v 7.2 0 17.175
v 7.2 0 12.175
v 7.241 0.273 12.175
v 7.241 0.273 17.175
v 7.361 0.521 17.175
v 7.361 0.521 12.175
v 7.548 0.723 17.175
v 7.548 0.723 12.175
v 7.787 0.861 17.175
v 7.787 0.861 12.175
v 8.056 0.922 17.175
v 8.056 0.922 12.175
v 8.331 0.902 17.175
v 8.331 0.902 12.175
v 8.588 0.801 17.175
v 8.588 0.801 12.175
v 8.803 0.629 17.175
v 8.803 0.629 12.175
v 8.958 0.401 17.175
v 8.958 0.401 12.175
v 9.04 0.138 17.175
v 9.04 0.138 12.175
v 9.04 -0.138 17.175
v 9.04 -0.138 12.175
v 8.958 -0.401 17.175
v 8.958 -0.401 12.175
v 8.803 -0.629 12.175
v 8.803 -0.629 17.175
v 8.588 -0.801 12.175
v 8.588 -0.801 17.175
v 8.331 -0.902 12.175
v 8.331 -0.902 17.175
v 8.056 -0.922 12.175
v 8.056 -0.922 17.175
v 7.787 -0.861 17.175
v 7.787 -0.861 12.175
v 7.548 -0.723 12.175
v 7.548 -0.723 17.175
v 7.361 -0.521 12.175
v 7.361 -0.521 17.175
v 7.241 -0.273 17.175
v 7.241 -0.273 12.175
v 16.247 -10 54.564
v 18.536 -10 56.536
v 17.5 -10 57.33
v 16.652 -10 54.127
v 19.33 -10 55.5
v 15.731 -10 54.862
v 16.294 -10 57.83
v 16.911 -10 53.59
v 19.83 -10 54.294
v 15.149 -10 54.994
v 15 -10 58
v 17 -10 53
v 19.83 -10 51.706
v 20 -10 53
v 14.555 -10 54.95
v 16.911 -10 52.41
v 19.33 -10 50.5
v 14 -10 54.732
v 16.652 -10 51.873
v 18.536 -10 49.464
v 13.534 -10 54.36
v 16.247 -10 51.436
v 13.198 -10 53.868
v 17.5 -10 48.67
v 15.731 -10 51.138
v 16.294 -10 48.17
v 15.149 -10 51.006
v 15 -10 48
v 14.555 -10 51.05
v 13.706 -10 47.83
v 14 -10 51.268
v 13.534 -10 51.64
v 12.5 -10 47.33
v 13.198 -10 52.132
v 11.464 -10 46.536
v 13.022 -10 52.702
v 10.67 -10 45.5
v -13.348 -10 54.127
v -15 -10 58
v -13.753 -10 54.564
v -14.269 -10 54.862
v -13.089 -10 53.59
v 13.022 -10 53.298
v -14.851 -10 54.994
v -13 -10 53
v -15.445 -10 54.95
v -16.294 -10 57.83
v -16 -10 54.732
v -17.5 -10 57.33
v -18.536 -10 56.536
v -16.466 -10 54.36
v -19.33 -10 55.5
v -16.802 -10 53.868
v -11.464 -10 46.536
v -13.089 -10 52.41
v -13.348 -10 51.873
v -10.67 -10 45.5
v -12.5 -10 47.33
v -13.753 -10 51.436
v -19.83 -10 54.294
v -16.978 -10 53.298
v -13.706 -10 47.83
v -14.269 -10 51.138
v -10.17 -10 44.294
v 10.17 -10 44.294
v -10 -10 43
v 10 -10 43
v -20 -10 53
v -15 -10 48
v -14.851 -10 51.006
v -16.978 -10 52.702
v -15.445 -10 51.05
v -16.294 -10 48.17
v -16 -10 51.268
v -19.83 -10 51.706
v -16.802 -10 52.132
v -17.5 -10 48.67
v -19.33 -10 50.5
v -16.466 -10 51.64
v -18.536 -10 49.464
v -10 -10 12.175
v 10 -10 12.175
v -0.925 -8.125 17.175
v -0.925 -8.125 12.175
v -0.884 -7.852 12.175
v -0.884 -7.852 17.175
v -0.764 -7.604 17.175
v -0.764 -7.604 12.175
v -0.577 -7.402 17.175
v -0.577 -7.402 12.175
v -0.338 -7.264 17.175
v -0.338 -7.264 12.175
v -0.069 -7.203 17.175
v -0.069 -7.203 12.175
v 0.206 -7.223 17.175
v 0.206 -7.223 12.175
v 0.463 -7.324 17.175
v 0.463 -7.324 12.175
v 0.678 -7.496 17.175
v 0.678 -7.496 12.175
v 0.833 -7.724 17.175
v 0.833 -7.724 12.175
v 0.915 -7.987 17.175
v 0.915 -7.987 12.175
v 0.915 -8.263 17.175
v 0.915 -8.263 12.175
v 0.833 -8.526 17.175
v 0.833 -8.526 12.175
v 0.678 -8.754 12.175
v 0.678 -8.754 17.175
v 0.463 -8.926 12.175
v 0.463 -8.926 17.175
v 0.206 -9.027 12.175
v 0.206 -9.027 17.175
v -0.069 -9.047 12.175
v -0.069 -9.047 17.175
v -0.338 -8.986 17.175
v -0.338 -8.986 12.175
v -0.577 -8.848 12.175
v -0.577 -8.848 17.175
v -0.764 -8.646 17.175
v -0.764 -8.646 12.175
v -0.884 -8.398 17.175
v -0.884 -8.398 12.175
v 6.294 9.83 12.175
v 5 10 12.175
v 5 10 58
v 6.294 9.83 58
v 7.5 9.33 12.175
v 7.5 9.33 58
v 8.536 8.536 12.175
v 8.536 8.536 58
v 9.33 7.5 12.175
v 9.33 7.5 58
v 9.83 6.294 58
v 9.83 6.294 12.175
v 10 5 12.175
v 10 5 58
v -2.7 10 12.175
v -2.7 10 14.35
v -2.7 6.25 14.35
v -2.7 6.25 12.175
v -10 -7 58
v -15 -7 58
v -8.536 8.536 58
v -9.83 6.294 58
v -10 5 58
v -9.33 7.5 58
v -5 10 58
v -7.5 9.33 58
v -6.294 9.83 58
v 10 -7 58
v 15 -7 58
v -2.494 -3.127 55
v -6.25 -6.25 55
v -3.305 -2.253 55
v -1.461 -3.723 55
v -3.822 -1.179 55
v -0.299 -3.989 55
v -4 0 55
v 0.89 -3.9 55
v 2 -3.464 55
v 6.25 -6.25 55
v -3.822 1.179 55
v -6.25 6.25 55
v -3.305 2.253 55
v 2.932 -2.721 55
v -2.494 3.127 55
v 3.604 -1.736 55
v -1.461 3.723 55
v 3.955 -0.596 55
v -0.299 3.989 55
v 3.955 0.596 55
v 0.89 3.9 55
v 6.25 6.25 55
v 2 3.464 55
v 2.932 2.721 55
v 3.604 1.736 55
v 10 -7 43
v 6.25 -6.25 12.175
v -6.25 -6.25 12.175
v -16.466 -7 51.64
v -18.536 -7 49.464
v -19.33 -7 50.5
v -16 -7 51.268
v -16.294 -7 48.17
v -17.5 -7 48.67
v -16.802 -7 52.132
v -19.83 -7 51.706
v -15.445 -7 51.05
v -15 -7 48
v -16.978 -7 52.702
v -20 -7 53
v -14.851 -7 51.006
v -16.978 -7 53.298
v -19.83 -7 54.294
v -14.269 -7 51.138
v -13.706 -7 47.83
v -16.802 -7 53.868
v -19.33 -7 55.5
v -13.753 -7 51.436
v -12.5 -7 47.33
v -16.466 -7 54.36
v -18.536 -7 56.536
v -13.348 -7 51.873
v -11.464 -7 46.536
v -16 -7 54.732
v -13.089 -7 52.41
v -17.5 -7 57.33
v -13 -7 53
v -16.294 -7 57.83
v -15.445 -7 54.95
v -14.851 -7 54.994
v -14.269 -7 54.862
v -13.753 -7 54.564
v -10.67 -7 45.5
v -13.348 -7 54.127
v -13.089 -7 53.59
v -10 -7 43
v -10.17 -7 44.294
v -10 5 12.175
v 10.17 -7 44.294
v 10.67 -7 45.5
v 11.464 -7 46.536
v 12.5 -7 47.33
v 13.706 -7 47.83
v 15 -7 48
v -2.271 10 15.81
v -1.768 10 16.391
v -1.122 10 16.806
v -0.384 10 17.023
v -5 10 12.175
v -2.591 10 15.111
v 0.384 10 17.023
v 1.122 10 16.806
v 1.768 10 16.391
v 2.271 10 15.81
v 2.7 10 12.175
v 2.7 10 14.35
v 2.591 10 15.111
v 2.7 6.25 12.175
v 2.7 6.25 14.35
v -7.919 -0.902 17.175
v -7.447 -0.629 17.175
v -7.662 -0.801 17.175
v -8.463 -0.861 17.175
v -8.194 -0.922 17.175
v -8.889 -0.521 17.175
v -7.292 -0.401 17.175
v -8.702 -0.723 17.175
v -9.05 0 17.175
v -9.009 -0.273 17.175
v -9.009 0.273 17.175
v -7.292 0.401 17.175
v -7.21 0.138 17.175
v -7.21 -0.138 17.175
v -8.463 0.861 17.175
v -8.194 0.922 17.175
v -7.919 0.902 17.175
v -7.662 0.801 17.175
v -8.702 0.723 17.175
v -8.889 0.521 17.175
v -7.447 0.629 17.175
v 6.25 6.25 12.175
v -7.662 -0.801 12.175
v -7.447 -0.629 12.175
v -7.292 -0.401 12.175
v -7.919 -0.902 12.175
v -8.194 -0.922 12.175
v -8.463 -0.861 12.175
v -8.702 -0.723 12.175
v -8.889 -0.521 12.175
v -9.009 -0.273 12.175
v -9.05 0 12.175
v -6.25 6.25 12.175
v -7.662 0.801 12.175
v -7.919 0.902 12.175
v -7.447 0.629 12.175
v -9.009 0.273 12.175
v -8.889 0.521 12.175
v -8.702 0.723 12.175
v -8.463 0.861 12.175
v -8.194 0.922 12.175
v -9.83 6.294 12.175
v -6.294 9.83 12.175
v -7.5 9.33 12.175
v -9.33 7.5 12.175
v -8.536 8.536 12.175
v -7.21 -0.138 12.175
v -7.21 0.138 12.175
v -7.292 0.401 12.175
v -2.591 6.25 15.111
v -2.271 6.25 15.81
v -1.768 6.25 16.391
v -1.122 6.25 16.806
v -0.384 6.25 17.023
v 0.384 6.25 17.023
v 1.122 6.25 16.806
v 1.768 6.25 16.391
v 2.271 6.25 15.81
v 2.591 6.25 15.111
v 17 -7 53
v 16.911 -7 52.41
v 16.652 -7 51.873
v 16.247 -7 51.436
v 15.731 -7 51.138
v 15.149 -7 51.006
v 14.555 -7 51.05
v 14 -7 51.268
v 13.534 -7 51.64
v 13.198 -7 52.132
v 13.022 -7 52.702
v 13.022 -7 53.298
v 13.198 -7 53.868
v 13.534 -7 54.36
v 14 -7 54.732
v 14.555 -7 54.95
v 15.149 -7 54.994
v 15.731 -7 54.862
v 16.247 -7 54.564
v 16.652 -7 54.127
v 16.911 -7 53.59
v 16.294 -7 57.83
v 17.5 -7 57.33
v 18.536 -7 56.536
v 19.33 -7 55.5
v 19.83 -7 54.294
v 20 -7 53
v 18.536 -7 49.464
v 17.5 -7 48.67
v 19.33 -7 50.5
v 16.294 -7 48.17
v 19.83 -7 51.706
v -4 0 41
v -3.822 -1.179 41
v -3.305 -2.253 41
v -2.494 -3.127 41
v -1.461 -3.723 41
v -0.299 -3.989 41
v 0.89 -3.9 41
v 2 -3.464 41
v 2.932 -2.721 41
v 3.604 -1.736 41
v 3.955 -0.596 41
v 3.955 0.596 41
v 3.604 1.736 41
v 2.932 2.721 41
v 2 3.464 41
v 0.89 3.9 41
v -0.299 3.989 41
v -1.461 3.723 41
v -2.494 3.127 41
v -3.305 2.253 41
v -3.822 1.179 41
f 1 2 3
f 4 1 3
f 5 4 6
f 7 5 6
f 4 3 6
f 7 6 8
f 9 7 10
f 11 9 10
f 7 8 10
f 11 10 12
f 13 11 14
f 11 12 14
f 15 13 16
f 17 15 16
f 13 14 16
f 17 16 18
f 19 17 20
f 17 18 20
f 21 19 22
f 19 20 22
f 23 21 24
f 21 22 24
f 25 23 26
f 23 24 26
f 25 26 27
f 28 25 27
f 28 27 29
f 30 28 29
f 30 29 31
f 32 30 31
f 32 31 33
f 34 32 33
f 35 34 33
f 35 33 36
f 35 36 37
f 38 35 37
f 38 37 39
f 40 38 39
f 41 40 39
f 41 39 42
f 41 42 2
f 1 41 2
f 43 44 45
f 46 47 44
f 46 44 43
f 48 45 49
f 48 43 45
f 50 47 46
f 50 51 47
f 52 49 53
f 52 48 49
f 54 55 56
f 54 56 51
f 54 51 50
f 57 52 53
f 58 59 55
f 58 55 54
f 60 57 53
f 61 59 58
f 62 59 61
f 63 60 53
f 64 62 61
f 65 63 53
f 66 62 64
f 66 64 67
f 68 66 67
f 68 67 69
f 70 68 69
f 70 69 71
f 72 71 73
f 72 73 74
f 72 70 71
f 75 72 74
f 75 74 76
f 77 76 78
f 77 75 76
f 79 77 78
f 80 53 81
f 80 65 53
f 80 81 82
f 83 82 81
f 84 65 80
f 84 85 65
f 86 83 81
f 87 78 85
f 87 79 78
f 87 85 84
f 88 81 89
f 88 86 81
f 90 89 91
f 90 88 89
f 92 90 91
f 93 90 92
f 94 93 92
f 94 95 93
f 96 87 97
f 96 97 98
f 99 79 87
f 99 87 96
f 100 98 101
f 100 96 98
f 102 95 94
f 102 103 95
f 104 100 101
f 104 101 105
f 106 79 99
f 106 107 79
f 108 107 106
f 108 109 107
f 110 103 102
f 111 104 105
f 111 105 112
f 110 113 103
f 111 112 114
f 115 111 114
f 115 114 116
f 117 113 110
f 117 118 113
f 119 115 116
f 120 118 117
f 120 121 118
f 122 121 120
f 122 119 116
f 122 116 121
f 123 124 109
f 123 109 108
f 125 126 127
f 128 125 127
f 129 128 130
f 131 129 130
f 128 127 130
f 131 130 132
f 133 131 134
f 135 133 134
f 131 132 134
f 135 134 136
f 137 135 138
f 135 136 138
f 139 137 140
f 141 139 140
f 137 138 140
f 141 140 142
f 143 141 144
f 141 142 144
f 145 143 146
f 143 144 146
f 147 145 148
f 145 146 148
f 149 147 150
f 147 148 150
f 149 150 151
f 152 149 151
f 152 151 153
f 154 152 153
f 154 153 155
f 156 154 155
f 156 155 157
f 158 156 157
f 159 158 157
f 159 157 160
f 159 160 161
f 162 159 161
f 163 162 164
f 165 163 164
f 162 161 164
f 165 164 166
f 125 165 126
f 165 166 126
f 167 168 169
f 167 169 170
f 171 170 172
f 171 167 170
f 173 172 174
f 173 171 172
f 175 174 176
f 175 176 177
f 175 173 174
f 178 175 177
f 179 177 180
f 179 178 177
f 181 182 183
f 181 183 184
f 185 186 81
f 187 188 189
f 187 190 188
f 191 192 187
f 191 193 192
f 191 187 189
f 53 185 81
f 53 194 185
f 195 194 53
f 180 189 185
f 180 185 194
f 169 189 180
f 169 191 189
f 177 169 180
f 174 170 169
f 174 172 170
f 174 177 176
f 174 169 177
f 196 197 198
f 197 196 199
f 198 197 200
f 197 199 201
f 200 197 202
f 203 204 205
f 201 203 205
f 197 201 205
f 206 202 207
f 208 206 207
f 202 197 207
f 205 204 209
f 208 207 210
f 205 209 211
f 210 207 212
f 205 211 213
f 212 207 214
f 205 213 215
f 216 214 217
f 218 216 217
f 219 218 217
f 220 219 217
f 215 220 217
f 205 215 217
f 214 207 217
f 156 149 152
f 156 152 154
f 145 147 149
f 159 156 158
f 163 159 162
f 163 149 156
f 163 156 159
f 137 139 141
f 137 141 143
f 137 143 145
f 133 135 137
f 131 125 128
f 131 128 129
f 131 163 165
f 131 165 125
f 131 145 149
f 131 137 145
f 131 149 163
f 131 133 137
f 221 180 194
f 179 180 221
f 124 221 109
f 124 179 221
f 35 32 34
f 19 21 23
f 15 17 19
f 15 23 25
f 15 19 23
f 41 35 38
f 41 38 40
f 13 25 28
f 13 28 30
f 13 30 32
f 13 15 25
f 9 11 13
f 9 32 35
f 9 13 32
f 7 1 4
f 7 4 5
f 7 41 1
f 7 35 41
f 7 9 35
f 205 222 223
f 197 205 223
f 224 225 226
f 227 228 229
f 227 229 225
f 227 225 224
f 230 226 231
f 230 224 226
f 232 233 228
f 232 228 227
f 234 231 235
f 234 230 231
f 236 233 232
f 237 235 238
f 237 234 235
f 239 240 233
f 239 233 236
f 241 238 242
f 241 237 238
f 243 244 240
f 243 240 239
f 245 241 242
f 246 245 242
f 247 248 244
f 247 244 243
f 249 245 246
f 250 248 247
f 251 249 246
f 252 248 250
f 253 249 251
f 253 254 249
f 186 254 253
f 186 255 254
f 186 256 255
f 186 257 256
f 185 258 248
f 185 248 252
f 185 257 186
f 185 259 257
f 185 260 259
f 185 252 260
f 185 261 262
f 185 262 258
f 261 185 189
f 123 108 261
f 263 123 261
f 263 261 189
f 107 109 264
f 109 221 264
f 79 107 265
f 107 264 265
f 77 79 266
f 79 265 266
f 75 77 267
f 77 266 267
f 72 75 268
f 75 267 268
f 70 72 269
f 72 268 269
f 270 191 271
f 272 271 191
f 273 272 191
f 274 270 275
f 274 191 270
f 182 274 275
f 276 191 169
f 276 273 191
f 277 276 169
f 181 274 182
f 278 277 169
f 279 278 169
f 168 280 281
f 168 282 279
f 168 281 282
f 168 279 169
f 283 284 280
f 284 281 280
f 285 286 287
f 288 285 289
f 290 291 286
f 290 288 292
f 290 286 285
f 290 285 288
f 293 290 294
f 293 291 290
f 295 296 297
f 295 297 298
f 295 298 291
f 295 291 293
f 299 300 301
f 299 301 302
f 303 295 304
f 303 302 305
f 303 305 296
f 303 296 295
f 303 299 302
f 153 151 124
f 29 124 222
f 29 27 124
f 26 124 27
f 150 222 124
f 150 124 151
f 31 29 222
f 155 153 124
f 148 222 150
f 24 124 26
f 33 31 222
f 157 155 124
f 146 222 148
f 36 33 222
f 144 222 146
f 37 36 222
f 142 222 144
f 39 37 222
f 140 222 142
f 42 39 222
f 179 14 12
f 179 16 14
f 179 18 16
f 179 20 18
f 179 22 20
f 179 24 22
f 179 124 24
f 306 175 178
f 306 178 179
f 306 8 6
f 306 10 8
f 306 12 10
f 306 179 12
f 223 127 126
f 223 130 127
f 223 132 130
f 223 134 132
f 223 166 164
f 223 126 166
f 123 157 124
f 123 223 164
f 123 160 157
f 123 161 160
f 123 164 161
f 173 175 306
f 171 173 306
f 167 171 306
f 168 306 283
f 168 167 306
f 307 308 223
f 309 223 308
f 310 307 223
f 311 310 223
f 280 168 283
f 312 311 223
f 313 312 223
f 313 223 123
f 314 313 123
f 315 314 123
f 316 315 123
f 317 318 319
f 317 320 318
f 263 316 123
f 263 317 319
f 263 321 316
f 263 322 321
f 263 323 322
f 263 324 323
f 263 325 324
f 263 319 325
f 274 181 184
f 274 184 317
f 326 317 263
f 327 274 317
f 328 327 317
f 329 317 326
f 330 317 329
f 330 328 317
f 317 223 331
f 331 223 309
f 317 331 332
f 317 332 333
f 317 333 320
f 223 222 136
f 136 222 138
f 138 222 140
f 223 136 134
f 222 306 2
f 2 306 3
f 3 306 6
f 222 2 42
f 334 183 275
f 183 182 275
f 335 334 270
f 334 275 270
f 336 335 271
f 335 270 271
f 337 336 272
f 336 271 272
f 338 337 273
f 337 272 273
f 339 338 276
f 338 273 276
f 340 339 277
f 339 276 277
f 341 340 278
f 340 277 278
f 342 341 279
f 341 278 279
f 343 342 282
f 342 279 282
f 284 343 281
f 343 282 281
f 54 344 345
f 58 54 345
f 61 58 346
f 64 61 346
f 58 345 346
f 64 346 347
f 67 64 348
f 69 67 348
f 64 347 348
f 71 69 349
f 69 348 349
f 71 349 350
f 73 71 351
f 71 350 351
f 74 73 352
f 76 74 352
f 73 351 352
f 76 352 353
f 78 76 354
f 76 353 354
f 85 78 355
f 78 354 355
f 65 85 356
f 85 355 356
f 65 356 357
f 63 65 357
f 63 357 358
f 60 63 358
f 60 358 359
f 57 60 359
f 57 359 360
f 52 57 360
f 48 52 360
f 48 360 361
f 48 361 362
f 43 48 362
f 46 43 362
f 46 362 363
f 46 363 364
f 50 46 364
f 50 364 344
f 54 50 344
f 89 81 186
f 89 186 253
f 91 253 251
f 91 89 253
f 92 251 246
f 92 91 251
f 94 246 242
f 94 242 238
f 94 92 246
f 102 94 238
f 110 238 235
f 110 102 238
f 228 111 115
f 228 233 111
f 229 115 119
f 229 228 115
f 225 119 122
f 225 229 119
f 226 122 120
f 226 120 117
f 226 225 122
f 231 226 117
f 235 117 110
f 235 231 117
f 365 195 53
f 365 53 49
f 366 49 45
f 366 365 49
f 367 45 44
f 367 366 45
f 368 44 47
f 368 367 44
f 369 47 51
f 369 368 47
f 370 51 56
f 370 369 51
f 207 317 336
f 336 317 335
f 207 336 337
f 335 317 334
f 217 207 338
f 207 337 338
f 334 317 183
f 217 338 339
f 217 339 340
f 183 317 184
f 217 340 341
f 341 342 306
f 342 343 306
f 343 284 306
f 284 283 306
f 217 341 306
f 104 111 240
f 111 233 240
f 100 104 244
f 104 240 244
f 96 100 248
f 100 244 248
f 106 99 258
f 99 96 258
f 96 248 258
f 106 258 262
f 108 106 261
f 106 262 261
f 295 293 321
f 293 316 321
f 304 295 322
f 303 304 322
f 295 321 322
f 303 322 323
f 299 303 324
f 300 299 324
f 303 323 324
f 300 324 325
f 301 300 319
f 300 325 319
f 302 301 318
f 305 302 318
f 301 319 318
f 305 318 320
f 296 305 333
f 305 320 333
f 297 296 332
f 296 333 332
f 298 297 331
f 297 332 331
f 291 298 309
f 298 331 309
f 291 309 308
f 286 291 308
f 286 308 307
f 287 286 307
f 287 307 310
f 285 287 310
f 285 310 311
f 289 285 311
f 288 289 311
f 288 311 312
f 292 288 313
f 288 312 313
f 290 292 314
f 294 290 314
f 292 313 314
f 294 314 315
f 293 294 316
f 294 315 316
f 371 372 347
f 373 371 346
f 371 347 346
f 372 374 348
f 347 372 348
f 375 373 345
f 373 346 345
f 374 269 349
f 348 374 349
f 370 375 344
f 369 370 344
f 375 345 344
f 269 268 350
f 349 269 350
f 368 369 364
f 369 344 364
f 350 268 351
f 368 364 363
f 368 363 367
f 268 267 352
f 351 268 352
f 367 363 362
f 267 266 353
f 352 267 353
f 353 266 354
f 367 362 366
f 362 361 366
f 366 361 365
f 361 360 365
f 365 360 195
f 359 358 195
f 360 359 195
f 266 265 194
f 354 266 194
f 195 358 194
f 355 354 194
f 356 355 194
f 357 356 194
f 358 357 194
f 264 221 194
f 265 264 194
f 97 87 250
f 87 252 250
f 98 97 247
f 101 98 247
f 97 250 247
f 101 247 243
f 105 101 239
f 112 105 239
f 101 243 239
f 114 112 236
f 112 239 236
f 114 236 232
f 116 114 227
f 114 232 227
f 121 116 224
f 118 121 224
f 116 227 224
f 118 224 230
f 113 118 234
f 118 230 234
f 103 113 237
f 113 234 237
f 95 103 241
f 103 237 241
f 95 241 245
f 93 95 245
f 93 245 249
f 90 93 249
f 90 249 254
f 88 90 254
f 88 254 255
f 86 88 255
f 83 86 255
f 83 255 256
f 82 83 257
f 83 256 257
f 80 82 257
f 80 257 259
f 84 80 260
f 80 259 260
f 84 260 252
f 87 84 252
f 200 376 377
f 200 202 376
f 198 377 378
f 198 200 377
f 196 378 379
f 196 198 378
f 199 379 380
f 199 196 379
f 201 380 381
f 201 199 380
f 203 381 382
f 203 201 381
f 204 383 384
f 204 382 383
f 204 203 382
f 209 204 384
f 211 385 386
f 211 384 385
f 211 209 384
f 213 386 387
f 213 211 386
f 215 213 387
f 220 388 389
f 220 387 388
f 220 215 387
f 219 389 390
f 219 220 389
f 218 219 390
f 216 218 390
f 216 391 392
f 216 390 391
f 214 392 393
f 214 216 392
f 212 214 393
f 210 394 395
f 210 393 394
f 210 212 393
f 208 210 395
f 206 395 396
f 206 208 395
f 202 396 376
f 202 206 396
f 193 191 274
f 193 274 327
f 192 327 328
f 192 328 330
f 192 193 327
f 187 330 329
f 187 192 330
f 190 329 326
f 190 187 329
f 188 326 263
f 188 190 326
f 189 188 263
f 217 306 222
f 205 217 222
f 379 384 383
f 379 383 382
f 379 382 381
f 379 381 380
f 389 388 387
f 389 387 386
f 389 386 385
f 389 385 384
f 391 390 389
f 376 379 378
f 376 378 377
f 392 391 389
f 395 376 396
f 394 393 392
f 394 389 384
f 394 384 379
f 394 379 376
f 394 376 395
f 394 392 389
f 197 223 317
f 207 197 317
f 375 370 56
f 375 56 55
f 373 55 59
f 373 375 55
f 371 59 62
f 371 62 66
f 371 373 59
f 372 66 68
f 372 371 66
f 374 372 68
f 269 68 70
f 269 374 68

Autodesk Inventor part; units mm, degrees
ref_plane "YZ Plane" through (0, 0, 0) normal (1, 0, 0) x (0, 1, 0)
ref_plane "XZ Plane" through (0, 0, 0) normal (0, 1, 0) x (-1, 0, 0)
ref_plane "XY Plane" through (0, 0, 0) normal (0, 0, 1) x (1, 0, 0)
sketch "Sketch1" plane through (0, 0, 0) normal (0, 0, 1) x (1, 0, 0)
  line L0 (-6.25, 6.25) -> (6.25, 6.25)
  line L1 (6.25, 6.25) -> (6.25, -6.25)
  line L2 (6.25, -6.25) -> (-6.25, -6.25)
  line L3 (-6.25, -6.25) -> (-6.25, 6.25)
  line L4 (-10, 10) -> (10, 10)
  line L5 (10, 10) -> (10, -10)
  line L6 (10, -10) -> (-10, -10)
  line L7 (-10, -10) -> (-10, 10)
  line L8 (-10, 10) -> (10, -10) construction
  line L9 (10, 10) -> (-10, -10) construction
  dimension "d3" = 20
  dimension "d4" = 20
  dimension "d5" = 3.75
  dimension "d6" = 16.25
  dimension "d7" = 3.75
  dimension "d8" = 16.25
extrude "Extrusion1" add sketch "Sketch1" along normal blind 55
sketch "Sketch2" plane through (0, 0, 55) normal (0, 0, 1) x (1, 0, 0)
  line L0 (10, 10) -> (-10, 10) projected
  line L1 (-10, -10) -> (10, -10)
  line L2 (10, -10) -> (10, 10)
  line L3 (10, 10) -> (-10, 10)
  line L4 (-10, 10) -> (-10, -10)
  line L5 (-10, -10) -> (10, 10) construction
  line L6 (10, -10) -> (-10, 10) construction
  point P0 (0, 0)
extrude "Extrusion2" add sketch "Sketch2" along normal blind 3
sketch "Sketch3" plane through (0, 0, 55) normal (0, 0, -1) x (-1, 0, 0)
  circle A0 centre (0, 0) radius 4
  dimension "d13" = 8
extrude "Extrusion3" add sketch "Sketch3" along normal blind 14
sketch "Sketch4" plane through (10, -10, 0) normal (1, 0, 0) x (0, 0, -1)
  line L0 (0, 0) -> (-58, 0) projected
  line L1 (0, 0) -> (-10, 0)
  line L2 (-10, 0) -> (-10, 3)
  line L3 (-10, 3) -> (0, 3)
  line L4 (0, 3) -> (0, 0)
  line L5 (-58, 0) -> (-58, 20) projected
  line L6 (-58, 0) -> (-48, 0)
  line L7 (-48, 0) -> (-48, 3)
  line L8 (-48, 3) -> (-58, 3)
  line L9 (-58, 3) -> (-58, 0)
  point P0 (0, 10)
  dimension "d16" = 10
  dimension "d17" = 3
  dimension "d18" = 10
  dimension "d19" = 3
extrude "Extrusion4" add sketch "Sketch4" along normal blind 10
sketch "Sketch5" plane through (-10, -10, 0) normal (-1, 0, 0) x (0, 0, 1)
  line L0 (0, 0) -> (0, 20) projected
  line L1 (0, 3) -> (10, 3) projected
  line L2 (0, 0) -> (10, 0)
  line L3 (10, 0) -> (10, 3)
  line L4 (10, 3) -> (0, 3)
  line L5 (0, 3) -> (0, 0)
  line L6 (58, 20) -> (58, 0) projected
  line L7 (58, 0) -> (48, 0)
  line L8 (48, 0) -> (48, 3)
  line L9 (48, 3) -> (58, 3)
  line L10 (58, 3) -> (58, 0)
  point P0 (0, 10)
  dimension "d22" = 10
  dimension "d23" = 3
  dimension "d24" = 10
  dimension "d25" = 3
extrude "Extrusion5" add sketch "Sketch5" along normal blind 10
fillet "Fillet1" radius 5 12 edges at (-20, -8.5, 10) (-20, -8.5, 0) (-10, -8.5, 10) (-10, -8.5, 48) (-20, -8.5, 48) (-20, -8.5, 58) (20, -8.5, 0) (10, -8.5, 10) (20, -8.5, 10) (10, -8.5, 48) (20, -8.5, 48) (20, -8.5, 58)
sketch "Sketch6" plane through (10, -7, 15) normal (0, 1, 0) x (1, 0, 0)
  arc A0 (-25, 15) -> (-25, 5) centre (-25, 10) ccw projected
  circle A1 centre (-25, 10) radius 2
  arc A2 (5, 5) -> (5, 15) centre (5, 10) ccw projected
  circle A3 centre (5, 10) radius 2
  arc A4 (-25, -33) -> (-25, -43) centre (-25, -38) ccw projected
  circle A5 centre (-25, -38) radius 2
  arc A6 (5, -43) -> (5, -33) centre (5, -38) ccw projected
  circle A7 centre (5, -38) radius 2
  point P0 (-10, 15)
  dimension "d29" = 4
  dimension "d30" = 4
  dimension "d31" = 4
extrude "Extrusion6" cut sketch "Sketch6" against normal blind 10
fillet "Fillet2" radius 5 2 edges at (-10, 10, 29) (10, 10, 29)
sketch "Sketch7" plane through (-5, 10, 0) normal (0, 1, 0) x (1, 0, 0)
  arc A0 (7.7, -10) -> (2.3, -10) centre (5, -10) ccw
  line L0 (0, -58) -> (0, 0) projected
  arc A1 (2.3, -14.35) -> (7.7, -14.35) centre (5, -14.35) ccw
  line L1 (2.3, -14.35) -> (2.3, -10)
  line L2 (7.7, -14.35) -> (7.7, -10)
  point P0 (5, 0)
  dimension "d35" = 5.4
  dimension "d36" = 5
  dimension "d37" = 10
  dimension "d38" = 5.4
  dimension "d39" = 4.35
  dimension "d40" = 5
extrude "Extrusion7" cut sketch "Sketch7" against normal blind 10
sketch "Sketch8" plane through (-5, 10, 0) normal (0, 1, 0) x (1, 0, 0)
  line L0 (2.3, -10) -> (2.3, -14.35) projected
  line L1 (2.3, -12.175) -> (-5, -12.175)
  line L2 (-5, 0) -> (-5, -58) projected
  arc A0 (-5, -15) -> (-10, -10) centre (-10, -15) ccw projected
  line L3 (-5, -12.175) -> (-5, -15)
  line L4 (-5, -15) -> (-18.139, -15)
  line L5 (-18.139, -15) -> (-18.139, 3.699)
  line L6 (-18.139, 3.699) -> (27.6458, 3.699)
  line L7 (27.6458, 3.699) -> (27.6458, -15)
  line L8 (15, -15) -> (15, -43) projected
  line L9 (27.6458, -15) -> (15, -15)
  line L10 (15, -15) -> (15, -12.175)
  arc A1 (20, -10) -> (15, -15) centre (20, -15) ccw projected
  line L11 (15, -12.175) -> (2.3, -12.175)
  point P0 (5, 0)
  dimension "d43" = 12.6458
  dimension "d44" = 33.139
  dimension "d45" = 18.699
extrude "Extrusion8" cut sketch "Sketch8" against normal blind 20
sketch "Sketch9" plane through (-2.7, 10, 12.175) normal (0, 0, -1) x (-1, 0, 0)
  circle A0 centre (-10.825, -10) radius 0.925
  circle A1 centre (-2.7, -18.125) radius 0.925
  circle A2 centre (5.425, -10) radius 0.925
  line L0 (-12.7, -20) -> (-12.7, -5) projected
  line L1 (7.3, -20) -> (-12.7, -20) projected
  line L2 (3.55, -16.25) -> (3.55, -3.75) projected
  point P0 (-2.7, -10)
  dimension "d48" = 1.85
  dimension "d49" = 1.85
  dimension "d50" = 1.85
  dimension "d51" = 1.875
  dimension "d52" = 1.875
  dimension "d53" = 1.875
  dimension "d54" = 0
  dimension "d55" = 0
  dimension "d56" = 0
extrude "Extrusion9" cut sketch "Sketch9" against normal blind 5
properties part number "14 slot pinhuls groot"
